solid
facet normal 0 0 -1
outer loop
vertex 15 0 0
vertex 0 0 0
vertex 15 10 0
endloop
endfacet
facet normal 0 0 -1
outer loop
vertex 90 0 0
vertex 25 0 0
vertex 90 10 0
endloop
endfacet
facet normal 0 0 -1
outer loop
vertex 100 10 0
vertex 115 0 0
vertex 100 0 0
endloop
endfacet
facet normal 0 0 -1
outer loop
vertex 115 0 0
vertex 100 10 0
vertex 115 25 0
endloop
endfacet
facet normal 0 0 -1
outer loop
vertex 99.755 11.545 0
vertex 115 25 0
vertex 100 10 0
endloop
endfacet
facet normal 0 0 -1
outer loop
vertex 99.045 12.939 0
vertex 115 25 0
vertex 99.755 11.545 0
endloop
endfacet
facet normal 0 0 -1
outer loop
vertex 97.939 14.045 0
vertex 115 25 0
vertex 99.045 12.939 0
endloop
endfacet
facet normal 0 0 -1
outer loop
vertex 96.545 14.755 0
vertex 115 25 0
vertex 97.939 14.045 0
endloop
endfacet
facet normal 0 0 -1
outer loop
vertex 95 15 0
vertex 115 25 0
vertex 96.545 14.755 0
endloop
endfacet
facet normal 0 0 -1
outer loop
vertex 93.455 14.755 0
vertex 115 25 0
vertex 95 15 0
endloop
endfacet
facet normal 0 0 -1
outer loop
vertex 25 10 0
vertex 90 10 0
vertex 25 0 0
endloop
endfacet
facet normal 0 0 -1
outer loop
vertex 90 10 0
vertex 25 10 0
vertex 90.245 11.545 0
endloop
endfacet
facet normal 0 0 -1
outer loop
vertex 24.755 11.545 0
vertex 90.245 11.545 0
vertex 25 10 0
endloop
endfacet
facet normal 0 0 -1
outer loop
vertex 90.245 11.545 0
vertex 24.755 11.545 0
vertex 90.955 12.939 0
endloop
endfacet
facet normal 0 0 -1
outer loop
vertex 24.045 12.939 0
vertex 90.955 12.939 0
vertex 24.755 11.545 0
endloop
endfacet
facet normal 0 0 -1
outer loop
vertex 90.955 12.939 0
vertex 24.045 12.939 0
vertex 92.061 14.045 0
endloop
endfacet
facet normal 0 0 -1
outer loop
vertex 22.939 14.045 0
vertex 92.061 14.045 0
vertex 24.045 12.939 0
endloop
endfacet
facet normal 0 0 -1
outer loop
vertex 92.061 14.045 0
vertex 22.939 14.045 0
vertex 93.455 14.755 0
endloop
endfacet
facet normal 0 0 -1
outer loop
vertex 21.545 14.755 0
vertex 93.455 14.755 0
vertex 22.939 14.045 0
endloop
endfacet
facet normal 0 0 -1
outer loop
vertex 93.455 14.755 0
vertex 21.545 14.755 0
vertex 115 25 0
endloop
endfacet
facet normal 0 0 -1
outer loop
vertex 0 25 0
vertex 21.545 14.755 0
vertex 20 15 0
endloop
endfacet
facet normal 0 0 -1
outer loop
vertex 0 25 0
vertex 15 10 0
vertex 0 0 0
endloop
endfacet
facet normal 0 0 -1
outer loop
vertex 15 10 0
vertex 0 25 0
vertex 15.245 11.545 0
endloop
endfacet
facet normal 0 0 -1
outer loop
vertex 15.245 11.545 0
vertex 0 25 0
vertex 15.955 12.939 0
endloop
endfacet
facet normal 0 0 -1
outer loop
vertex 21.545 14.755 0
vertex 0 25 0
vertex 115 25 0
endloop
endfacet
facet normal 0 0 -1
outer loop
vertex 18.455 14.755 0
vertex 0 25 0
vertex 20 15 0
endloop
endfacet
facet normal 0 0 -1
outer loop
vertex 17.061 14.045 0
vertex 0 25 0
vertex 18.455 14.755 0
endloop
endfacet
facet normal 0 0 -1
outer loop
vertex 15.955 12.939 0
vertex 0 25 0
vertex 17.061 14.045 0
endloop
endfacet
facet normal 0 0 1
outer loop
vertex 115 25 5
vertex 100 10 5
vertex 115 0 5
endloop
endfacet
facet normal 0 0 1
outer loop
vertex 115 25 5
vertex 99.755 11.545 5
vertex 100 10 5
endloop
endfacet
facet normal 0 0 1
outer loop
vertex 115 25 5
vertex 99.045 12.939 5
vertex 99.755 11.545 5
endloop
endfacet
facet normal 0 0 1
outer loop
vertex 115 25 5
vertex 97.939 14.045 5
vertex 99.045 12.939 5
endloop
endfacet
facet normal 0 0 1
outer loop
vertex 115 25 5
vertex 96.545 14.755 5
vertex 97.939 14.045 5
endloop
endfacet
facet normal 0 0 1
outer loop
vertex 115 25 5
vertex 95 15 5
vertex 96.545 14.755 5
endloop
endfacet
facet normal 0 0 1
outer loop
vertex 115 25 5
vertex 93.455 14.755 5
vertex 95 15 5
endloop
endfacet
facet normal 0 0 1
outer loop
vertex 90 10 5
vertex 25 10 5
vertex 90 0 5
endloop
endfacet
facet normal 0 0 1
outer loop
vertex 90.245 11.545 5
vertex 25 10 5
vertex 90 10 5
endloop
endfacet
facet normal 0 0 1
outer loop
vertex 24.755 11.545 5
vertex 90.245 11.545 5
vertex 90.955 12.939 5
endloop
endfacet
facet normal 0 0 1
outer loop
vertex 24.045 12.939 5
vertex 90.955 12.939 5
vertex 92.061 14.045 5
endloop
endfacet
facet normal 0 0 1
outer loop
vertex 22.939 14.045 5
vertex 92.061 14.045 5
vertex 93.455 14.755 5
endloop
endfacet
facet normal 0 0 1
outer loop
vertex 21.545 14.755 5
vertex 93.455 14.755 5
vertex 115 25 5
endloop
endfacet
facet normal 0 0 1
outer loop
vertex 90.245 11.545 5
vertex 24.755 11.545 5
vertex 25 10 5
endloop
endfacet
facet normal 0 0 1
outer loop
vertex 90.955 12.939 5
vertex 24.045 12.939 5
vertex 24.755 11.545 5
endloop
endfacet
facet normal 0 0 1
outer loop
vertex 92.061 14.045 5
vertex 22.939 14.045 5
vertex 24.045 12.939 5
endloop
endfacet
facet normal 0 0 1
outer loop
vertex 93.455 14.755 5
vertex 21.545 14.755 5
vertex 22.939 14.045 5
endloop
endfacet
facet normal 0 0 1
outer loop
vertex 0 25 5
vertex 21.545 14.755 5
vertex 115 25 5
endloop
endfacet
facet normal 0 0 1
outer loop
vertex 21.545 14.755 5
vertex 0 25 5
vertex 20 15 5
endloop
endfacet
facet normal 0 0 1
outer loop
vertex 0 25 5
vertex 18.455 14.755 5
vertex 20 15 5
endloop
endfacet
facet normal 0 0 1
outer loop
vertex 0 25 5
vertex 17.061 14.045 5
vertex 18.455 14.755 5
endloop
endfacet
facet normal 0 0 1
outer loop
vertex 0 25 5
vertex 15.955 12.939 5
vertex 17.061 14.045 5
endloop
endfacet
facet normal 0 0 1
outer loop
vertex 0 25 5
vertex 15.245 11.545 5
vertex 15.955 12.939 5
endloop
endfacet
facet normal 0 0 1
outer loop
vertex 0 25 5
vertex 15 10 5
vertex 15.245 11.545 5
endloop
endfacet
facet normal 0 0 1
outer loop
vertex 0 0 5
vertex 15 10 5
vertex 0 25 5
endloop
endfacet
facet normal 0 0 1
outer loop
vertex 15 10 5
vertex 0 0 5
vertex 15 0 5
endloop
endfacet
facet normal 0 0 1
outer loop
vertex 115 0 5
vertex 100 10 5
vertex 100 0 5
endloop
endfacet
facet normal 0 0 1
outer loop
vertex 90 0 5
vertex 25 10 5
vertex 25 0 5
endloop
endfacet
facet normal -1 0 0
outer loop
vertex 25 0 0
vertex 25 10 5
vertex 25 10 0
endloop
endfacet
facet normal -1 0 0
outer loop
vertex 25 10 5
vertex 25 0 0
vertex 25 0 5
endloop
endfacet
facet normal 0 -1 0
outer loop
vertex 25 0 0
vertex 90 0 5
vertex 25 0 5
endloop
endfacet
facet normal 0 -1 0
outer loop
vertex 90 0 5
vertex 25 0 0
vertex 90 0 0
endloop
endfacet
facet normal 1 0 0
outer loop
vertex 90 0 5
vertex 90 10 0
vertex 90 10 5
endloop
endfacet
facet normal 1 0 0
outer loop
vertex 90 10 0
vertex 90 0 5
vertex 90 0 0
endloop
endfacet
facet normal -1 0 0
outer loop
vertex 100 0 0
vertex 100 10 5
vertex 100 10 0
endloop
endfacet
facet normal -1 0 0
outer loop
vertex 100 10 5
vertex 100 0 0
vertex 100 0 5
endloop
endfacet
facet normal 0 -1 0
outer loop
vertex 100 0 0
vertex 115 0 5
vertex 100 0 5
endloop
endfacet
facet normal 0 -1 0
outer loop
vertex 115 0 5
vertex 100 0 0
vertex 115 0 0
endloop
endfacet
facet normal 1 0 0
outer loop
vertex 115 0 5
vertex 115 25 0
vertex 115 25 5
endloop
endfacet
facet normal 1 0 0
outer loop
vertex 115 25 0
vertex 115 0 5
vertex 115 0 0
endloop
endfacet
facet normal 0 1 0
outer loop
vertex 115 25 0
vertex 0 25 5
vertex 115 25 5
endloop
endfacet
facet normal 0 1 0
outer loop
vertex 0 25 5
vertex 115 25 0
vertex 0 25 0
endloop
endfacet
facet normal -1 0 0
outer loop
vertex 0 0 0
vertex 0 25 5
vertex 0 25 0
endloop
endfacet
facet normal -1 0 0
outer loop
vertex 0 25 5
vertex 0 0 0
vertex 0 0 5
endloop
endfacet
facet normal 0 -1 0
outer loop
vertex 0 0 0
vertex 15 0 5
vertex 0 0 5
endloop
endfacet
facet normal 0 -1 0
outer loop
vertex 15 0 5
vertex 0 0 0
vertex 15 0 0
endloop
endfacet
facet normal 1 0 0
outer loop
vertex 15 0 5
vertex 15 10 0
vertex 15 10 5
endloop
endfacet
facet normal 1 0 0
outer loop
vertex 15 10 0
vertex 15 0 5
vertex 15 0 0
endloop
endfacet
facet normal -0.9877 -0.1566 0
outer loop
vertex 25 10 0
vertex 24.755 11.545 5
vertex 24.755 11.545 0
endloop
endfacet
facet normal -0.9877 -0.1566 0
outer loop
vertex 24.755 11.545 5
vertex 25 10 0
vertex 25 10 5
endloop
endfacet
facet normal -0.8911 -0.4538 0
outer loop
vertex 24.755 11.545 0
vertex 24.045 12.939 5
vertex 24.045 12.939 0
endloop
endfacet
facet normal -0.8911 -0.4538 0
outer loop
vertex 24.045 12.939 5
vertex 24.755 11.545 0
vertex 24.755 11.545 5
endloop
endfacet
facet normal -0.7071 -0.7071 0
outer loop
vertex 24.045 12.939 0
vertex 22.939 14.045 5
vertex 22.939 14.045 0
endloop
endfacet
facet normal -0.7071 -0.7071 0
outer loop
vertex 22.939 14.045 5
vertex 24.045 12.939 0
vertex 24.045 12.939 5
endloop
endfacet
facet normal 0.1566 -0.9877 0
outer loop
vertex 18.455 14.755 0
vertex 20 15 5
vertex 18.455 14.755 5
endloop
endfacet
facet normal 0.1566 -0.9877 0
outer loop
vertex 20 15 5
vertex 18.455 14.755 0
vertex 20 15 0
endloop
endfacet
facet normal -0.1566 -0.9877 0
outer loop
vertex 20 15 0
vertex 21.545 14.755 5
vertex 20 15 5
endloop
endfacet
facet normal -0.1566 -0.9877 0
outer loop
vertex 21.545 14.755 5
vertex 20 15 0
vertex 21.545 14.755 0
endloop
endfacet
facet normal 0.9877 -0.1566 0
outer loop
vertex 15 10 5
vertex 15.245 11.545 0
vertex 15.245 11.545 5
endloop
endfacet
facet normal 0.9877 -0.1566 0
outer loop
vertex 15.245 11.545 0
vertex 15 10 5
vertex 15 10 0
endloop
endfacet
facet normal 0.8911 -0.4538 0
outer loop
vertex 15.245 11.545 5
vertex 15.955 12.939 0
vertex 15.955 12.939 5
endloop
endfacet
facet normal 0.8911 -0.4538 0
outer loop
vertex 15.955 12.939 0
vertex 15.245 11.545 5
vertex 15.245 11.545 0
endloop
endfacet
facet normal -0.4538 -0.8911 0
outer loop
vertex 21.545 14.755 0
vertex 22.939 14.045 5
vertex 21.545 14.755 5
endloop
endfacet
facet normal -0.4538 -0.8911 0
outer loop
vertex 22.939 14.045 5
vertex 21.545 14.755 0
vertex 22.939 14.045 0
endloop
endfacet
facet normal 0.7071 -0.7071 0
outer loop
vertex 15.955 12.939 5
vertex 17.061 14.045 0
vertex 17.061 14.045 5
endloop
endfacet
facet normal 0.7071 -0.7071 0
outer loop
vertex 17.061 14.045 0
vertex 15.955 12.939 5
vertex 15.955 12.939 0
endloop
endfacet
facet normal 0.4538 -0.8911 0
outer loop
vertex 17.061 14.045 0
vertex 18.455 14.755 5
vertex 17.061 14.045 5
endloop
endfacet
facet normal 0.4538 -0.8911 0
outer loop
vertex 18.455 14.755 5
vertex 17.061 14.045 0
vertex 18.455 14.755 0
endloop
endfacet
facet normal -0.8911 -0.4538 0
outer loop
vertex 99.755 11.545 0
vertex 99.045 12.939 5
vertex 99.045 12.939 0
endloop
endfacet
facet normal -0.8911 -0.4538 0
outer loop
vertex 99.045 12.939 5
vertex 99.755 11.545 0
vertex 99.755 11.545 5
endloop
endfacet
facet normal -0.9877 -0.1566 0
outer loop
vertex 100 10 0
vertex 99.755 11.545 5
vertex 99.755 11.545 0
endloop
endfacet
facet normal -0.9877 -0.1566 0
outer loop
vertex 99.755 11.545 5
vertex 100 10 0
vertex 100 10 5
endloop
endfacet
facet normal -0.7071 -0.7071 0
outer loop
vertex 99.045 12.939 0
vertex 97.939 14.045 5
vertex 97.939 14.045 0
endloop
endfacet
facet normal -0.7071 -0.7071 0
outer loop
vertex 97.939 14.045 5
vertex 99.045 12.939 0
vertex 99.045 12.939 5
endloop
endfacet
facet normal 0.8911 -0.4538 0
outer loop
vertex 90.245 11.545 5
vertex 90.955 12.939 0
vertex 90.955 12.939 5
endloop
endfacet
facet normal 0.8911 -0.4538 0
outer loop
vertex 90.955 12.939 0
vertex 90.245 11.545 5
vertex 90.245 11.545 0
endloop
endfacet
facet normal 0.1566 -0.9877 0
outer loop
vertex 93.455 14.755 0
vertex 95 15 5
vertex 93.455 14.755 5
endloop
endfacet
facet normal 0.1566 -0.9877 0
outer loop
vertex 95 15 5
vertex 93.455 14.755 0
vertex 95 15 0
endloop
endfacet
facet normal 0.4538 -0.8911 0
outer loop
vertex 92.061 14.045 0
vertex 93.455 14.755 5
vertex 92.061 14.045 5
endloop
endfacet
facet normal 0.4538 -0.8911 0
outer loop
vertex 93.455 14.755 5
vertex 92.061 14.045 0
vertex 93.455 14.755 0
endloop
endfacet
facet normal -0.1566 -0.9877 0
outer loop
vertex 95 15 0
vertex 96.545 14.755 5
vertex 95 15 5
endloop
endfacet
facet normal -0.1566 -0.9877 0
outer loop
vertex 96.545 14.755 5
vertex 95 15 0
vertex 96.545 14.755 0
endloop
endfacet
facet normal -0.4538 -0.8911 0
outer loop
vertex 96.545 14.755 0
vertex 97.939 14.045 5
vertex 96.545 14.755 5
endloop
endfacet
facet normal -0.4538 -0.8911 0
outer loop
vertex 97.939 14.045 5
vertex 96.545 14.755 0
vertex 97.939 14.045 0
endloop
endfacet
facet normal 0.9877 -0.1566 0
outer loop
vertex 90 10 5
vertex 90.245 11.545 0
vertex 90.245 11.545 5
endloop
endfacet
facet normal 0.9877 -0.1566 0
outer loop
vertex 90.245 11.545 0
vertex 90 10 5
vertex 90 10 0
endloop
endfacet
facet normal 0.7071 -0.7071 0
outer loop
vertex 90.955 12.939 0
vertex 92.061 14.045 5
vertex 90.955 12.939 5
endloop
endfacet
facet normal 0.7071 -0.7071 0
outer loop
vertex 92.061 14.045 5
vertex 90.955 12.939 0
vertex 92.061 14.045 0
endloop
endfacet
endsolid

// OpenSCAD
/*
* Cupboard Doors Holder
* This was designed to prevent my cats from
* Opening my kitchen/bathroom cupboards
* (Yes I've got quite Eveil cats ;) )
*/


/* 
*  Configuration Variables
*/

Thickness = 5 ;
Knob_Width = 10 ;
Inner_Knob_Distance = 65 ;

/* [Hidden] */
Strenght_Factor = 1.5 ;

// End Configuration

module cupboard_doorstop(THICKNESS, KNOB_WIDTH, INNER_KNOB_DISTANCE, STRENGHT_FACTOR)
{
	TOTAL_HEIGHT = KNOB_WIDTH + KNOB_WIDTH*STRENGHT_FACTOR ;
	TOTAL_LENGTH = KNOB_WIDTH*2 + (KNOB_WIDTH*STRENGHT_FACTOR)*2 + INNER_KNOB_DISTANCE ;
	
	difference() {
		difference() {
			linear_extrude(height = THICKNESS, center = false, convexity = 10, twist = 0)
			polygon(points=[[0,0],[0,TOTAL_HEIGHT],[TOTAL_LENGTH,TOTAL_HEIGHT],[TOTAL_LENGTH,0],[TOTAL_LENGTH-(KNOB_WIDTH*STRENGHT_FACTOR),0],[TOTAL_LENGTH-(KNOB_WIDTH*STRENGHT_FACTOR),KNOB_WIDTH],[TOTAL_LENGTH-(KNOB_WIDTH*STRENGHT_FACTOR)-KNOB_WIDTH,KNOB_WIDTH],[TOTAL_LENGTH-(KNOB_WIDTH*STRENGHT_FACTOR)-KNOB_WIDTH,0],[KNOB_WIDTH*STRENGHT_FACTOR+KNOB_WIDTH,0],[KNOB_WIDTH*STRENGHT_FACTOR+KNOB_WIDTH,KNOB_WIDTH],[KNOB_WIDTH*STRENGHT_FACTOR,KNOB_WIDTH],[KNOB_WIDTH*STRENGHT_FACTOR,0]]);
			
			translate([KNOB_WIDTH*STRENGHT_FACTOR+(KNOB_WIDTH/2),KNOB_WIDTH,-0.5])
			cylinder(h= THICKNESS+1, r=KNOB_WIDTH/2, $fn=20) ;
		}
		translate([TOTAL_LENGTH-(KNOB_WIDTH*STRENGHT_FACTOR+(KNOB_WIDTH/2)),KNOB_WIDTH,-0.5])
		cylinder(h= THICKNESS+1, r=KNOB_WIDTH/2, $fn=20) ;
	}
}



// Draw it ;)
cupboard_doorstop(Thickness, Knob_Width, Inner_Knob_Distance, Strenght_Factor);
